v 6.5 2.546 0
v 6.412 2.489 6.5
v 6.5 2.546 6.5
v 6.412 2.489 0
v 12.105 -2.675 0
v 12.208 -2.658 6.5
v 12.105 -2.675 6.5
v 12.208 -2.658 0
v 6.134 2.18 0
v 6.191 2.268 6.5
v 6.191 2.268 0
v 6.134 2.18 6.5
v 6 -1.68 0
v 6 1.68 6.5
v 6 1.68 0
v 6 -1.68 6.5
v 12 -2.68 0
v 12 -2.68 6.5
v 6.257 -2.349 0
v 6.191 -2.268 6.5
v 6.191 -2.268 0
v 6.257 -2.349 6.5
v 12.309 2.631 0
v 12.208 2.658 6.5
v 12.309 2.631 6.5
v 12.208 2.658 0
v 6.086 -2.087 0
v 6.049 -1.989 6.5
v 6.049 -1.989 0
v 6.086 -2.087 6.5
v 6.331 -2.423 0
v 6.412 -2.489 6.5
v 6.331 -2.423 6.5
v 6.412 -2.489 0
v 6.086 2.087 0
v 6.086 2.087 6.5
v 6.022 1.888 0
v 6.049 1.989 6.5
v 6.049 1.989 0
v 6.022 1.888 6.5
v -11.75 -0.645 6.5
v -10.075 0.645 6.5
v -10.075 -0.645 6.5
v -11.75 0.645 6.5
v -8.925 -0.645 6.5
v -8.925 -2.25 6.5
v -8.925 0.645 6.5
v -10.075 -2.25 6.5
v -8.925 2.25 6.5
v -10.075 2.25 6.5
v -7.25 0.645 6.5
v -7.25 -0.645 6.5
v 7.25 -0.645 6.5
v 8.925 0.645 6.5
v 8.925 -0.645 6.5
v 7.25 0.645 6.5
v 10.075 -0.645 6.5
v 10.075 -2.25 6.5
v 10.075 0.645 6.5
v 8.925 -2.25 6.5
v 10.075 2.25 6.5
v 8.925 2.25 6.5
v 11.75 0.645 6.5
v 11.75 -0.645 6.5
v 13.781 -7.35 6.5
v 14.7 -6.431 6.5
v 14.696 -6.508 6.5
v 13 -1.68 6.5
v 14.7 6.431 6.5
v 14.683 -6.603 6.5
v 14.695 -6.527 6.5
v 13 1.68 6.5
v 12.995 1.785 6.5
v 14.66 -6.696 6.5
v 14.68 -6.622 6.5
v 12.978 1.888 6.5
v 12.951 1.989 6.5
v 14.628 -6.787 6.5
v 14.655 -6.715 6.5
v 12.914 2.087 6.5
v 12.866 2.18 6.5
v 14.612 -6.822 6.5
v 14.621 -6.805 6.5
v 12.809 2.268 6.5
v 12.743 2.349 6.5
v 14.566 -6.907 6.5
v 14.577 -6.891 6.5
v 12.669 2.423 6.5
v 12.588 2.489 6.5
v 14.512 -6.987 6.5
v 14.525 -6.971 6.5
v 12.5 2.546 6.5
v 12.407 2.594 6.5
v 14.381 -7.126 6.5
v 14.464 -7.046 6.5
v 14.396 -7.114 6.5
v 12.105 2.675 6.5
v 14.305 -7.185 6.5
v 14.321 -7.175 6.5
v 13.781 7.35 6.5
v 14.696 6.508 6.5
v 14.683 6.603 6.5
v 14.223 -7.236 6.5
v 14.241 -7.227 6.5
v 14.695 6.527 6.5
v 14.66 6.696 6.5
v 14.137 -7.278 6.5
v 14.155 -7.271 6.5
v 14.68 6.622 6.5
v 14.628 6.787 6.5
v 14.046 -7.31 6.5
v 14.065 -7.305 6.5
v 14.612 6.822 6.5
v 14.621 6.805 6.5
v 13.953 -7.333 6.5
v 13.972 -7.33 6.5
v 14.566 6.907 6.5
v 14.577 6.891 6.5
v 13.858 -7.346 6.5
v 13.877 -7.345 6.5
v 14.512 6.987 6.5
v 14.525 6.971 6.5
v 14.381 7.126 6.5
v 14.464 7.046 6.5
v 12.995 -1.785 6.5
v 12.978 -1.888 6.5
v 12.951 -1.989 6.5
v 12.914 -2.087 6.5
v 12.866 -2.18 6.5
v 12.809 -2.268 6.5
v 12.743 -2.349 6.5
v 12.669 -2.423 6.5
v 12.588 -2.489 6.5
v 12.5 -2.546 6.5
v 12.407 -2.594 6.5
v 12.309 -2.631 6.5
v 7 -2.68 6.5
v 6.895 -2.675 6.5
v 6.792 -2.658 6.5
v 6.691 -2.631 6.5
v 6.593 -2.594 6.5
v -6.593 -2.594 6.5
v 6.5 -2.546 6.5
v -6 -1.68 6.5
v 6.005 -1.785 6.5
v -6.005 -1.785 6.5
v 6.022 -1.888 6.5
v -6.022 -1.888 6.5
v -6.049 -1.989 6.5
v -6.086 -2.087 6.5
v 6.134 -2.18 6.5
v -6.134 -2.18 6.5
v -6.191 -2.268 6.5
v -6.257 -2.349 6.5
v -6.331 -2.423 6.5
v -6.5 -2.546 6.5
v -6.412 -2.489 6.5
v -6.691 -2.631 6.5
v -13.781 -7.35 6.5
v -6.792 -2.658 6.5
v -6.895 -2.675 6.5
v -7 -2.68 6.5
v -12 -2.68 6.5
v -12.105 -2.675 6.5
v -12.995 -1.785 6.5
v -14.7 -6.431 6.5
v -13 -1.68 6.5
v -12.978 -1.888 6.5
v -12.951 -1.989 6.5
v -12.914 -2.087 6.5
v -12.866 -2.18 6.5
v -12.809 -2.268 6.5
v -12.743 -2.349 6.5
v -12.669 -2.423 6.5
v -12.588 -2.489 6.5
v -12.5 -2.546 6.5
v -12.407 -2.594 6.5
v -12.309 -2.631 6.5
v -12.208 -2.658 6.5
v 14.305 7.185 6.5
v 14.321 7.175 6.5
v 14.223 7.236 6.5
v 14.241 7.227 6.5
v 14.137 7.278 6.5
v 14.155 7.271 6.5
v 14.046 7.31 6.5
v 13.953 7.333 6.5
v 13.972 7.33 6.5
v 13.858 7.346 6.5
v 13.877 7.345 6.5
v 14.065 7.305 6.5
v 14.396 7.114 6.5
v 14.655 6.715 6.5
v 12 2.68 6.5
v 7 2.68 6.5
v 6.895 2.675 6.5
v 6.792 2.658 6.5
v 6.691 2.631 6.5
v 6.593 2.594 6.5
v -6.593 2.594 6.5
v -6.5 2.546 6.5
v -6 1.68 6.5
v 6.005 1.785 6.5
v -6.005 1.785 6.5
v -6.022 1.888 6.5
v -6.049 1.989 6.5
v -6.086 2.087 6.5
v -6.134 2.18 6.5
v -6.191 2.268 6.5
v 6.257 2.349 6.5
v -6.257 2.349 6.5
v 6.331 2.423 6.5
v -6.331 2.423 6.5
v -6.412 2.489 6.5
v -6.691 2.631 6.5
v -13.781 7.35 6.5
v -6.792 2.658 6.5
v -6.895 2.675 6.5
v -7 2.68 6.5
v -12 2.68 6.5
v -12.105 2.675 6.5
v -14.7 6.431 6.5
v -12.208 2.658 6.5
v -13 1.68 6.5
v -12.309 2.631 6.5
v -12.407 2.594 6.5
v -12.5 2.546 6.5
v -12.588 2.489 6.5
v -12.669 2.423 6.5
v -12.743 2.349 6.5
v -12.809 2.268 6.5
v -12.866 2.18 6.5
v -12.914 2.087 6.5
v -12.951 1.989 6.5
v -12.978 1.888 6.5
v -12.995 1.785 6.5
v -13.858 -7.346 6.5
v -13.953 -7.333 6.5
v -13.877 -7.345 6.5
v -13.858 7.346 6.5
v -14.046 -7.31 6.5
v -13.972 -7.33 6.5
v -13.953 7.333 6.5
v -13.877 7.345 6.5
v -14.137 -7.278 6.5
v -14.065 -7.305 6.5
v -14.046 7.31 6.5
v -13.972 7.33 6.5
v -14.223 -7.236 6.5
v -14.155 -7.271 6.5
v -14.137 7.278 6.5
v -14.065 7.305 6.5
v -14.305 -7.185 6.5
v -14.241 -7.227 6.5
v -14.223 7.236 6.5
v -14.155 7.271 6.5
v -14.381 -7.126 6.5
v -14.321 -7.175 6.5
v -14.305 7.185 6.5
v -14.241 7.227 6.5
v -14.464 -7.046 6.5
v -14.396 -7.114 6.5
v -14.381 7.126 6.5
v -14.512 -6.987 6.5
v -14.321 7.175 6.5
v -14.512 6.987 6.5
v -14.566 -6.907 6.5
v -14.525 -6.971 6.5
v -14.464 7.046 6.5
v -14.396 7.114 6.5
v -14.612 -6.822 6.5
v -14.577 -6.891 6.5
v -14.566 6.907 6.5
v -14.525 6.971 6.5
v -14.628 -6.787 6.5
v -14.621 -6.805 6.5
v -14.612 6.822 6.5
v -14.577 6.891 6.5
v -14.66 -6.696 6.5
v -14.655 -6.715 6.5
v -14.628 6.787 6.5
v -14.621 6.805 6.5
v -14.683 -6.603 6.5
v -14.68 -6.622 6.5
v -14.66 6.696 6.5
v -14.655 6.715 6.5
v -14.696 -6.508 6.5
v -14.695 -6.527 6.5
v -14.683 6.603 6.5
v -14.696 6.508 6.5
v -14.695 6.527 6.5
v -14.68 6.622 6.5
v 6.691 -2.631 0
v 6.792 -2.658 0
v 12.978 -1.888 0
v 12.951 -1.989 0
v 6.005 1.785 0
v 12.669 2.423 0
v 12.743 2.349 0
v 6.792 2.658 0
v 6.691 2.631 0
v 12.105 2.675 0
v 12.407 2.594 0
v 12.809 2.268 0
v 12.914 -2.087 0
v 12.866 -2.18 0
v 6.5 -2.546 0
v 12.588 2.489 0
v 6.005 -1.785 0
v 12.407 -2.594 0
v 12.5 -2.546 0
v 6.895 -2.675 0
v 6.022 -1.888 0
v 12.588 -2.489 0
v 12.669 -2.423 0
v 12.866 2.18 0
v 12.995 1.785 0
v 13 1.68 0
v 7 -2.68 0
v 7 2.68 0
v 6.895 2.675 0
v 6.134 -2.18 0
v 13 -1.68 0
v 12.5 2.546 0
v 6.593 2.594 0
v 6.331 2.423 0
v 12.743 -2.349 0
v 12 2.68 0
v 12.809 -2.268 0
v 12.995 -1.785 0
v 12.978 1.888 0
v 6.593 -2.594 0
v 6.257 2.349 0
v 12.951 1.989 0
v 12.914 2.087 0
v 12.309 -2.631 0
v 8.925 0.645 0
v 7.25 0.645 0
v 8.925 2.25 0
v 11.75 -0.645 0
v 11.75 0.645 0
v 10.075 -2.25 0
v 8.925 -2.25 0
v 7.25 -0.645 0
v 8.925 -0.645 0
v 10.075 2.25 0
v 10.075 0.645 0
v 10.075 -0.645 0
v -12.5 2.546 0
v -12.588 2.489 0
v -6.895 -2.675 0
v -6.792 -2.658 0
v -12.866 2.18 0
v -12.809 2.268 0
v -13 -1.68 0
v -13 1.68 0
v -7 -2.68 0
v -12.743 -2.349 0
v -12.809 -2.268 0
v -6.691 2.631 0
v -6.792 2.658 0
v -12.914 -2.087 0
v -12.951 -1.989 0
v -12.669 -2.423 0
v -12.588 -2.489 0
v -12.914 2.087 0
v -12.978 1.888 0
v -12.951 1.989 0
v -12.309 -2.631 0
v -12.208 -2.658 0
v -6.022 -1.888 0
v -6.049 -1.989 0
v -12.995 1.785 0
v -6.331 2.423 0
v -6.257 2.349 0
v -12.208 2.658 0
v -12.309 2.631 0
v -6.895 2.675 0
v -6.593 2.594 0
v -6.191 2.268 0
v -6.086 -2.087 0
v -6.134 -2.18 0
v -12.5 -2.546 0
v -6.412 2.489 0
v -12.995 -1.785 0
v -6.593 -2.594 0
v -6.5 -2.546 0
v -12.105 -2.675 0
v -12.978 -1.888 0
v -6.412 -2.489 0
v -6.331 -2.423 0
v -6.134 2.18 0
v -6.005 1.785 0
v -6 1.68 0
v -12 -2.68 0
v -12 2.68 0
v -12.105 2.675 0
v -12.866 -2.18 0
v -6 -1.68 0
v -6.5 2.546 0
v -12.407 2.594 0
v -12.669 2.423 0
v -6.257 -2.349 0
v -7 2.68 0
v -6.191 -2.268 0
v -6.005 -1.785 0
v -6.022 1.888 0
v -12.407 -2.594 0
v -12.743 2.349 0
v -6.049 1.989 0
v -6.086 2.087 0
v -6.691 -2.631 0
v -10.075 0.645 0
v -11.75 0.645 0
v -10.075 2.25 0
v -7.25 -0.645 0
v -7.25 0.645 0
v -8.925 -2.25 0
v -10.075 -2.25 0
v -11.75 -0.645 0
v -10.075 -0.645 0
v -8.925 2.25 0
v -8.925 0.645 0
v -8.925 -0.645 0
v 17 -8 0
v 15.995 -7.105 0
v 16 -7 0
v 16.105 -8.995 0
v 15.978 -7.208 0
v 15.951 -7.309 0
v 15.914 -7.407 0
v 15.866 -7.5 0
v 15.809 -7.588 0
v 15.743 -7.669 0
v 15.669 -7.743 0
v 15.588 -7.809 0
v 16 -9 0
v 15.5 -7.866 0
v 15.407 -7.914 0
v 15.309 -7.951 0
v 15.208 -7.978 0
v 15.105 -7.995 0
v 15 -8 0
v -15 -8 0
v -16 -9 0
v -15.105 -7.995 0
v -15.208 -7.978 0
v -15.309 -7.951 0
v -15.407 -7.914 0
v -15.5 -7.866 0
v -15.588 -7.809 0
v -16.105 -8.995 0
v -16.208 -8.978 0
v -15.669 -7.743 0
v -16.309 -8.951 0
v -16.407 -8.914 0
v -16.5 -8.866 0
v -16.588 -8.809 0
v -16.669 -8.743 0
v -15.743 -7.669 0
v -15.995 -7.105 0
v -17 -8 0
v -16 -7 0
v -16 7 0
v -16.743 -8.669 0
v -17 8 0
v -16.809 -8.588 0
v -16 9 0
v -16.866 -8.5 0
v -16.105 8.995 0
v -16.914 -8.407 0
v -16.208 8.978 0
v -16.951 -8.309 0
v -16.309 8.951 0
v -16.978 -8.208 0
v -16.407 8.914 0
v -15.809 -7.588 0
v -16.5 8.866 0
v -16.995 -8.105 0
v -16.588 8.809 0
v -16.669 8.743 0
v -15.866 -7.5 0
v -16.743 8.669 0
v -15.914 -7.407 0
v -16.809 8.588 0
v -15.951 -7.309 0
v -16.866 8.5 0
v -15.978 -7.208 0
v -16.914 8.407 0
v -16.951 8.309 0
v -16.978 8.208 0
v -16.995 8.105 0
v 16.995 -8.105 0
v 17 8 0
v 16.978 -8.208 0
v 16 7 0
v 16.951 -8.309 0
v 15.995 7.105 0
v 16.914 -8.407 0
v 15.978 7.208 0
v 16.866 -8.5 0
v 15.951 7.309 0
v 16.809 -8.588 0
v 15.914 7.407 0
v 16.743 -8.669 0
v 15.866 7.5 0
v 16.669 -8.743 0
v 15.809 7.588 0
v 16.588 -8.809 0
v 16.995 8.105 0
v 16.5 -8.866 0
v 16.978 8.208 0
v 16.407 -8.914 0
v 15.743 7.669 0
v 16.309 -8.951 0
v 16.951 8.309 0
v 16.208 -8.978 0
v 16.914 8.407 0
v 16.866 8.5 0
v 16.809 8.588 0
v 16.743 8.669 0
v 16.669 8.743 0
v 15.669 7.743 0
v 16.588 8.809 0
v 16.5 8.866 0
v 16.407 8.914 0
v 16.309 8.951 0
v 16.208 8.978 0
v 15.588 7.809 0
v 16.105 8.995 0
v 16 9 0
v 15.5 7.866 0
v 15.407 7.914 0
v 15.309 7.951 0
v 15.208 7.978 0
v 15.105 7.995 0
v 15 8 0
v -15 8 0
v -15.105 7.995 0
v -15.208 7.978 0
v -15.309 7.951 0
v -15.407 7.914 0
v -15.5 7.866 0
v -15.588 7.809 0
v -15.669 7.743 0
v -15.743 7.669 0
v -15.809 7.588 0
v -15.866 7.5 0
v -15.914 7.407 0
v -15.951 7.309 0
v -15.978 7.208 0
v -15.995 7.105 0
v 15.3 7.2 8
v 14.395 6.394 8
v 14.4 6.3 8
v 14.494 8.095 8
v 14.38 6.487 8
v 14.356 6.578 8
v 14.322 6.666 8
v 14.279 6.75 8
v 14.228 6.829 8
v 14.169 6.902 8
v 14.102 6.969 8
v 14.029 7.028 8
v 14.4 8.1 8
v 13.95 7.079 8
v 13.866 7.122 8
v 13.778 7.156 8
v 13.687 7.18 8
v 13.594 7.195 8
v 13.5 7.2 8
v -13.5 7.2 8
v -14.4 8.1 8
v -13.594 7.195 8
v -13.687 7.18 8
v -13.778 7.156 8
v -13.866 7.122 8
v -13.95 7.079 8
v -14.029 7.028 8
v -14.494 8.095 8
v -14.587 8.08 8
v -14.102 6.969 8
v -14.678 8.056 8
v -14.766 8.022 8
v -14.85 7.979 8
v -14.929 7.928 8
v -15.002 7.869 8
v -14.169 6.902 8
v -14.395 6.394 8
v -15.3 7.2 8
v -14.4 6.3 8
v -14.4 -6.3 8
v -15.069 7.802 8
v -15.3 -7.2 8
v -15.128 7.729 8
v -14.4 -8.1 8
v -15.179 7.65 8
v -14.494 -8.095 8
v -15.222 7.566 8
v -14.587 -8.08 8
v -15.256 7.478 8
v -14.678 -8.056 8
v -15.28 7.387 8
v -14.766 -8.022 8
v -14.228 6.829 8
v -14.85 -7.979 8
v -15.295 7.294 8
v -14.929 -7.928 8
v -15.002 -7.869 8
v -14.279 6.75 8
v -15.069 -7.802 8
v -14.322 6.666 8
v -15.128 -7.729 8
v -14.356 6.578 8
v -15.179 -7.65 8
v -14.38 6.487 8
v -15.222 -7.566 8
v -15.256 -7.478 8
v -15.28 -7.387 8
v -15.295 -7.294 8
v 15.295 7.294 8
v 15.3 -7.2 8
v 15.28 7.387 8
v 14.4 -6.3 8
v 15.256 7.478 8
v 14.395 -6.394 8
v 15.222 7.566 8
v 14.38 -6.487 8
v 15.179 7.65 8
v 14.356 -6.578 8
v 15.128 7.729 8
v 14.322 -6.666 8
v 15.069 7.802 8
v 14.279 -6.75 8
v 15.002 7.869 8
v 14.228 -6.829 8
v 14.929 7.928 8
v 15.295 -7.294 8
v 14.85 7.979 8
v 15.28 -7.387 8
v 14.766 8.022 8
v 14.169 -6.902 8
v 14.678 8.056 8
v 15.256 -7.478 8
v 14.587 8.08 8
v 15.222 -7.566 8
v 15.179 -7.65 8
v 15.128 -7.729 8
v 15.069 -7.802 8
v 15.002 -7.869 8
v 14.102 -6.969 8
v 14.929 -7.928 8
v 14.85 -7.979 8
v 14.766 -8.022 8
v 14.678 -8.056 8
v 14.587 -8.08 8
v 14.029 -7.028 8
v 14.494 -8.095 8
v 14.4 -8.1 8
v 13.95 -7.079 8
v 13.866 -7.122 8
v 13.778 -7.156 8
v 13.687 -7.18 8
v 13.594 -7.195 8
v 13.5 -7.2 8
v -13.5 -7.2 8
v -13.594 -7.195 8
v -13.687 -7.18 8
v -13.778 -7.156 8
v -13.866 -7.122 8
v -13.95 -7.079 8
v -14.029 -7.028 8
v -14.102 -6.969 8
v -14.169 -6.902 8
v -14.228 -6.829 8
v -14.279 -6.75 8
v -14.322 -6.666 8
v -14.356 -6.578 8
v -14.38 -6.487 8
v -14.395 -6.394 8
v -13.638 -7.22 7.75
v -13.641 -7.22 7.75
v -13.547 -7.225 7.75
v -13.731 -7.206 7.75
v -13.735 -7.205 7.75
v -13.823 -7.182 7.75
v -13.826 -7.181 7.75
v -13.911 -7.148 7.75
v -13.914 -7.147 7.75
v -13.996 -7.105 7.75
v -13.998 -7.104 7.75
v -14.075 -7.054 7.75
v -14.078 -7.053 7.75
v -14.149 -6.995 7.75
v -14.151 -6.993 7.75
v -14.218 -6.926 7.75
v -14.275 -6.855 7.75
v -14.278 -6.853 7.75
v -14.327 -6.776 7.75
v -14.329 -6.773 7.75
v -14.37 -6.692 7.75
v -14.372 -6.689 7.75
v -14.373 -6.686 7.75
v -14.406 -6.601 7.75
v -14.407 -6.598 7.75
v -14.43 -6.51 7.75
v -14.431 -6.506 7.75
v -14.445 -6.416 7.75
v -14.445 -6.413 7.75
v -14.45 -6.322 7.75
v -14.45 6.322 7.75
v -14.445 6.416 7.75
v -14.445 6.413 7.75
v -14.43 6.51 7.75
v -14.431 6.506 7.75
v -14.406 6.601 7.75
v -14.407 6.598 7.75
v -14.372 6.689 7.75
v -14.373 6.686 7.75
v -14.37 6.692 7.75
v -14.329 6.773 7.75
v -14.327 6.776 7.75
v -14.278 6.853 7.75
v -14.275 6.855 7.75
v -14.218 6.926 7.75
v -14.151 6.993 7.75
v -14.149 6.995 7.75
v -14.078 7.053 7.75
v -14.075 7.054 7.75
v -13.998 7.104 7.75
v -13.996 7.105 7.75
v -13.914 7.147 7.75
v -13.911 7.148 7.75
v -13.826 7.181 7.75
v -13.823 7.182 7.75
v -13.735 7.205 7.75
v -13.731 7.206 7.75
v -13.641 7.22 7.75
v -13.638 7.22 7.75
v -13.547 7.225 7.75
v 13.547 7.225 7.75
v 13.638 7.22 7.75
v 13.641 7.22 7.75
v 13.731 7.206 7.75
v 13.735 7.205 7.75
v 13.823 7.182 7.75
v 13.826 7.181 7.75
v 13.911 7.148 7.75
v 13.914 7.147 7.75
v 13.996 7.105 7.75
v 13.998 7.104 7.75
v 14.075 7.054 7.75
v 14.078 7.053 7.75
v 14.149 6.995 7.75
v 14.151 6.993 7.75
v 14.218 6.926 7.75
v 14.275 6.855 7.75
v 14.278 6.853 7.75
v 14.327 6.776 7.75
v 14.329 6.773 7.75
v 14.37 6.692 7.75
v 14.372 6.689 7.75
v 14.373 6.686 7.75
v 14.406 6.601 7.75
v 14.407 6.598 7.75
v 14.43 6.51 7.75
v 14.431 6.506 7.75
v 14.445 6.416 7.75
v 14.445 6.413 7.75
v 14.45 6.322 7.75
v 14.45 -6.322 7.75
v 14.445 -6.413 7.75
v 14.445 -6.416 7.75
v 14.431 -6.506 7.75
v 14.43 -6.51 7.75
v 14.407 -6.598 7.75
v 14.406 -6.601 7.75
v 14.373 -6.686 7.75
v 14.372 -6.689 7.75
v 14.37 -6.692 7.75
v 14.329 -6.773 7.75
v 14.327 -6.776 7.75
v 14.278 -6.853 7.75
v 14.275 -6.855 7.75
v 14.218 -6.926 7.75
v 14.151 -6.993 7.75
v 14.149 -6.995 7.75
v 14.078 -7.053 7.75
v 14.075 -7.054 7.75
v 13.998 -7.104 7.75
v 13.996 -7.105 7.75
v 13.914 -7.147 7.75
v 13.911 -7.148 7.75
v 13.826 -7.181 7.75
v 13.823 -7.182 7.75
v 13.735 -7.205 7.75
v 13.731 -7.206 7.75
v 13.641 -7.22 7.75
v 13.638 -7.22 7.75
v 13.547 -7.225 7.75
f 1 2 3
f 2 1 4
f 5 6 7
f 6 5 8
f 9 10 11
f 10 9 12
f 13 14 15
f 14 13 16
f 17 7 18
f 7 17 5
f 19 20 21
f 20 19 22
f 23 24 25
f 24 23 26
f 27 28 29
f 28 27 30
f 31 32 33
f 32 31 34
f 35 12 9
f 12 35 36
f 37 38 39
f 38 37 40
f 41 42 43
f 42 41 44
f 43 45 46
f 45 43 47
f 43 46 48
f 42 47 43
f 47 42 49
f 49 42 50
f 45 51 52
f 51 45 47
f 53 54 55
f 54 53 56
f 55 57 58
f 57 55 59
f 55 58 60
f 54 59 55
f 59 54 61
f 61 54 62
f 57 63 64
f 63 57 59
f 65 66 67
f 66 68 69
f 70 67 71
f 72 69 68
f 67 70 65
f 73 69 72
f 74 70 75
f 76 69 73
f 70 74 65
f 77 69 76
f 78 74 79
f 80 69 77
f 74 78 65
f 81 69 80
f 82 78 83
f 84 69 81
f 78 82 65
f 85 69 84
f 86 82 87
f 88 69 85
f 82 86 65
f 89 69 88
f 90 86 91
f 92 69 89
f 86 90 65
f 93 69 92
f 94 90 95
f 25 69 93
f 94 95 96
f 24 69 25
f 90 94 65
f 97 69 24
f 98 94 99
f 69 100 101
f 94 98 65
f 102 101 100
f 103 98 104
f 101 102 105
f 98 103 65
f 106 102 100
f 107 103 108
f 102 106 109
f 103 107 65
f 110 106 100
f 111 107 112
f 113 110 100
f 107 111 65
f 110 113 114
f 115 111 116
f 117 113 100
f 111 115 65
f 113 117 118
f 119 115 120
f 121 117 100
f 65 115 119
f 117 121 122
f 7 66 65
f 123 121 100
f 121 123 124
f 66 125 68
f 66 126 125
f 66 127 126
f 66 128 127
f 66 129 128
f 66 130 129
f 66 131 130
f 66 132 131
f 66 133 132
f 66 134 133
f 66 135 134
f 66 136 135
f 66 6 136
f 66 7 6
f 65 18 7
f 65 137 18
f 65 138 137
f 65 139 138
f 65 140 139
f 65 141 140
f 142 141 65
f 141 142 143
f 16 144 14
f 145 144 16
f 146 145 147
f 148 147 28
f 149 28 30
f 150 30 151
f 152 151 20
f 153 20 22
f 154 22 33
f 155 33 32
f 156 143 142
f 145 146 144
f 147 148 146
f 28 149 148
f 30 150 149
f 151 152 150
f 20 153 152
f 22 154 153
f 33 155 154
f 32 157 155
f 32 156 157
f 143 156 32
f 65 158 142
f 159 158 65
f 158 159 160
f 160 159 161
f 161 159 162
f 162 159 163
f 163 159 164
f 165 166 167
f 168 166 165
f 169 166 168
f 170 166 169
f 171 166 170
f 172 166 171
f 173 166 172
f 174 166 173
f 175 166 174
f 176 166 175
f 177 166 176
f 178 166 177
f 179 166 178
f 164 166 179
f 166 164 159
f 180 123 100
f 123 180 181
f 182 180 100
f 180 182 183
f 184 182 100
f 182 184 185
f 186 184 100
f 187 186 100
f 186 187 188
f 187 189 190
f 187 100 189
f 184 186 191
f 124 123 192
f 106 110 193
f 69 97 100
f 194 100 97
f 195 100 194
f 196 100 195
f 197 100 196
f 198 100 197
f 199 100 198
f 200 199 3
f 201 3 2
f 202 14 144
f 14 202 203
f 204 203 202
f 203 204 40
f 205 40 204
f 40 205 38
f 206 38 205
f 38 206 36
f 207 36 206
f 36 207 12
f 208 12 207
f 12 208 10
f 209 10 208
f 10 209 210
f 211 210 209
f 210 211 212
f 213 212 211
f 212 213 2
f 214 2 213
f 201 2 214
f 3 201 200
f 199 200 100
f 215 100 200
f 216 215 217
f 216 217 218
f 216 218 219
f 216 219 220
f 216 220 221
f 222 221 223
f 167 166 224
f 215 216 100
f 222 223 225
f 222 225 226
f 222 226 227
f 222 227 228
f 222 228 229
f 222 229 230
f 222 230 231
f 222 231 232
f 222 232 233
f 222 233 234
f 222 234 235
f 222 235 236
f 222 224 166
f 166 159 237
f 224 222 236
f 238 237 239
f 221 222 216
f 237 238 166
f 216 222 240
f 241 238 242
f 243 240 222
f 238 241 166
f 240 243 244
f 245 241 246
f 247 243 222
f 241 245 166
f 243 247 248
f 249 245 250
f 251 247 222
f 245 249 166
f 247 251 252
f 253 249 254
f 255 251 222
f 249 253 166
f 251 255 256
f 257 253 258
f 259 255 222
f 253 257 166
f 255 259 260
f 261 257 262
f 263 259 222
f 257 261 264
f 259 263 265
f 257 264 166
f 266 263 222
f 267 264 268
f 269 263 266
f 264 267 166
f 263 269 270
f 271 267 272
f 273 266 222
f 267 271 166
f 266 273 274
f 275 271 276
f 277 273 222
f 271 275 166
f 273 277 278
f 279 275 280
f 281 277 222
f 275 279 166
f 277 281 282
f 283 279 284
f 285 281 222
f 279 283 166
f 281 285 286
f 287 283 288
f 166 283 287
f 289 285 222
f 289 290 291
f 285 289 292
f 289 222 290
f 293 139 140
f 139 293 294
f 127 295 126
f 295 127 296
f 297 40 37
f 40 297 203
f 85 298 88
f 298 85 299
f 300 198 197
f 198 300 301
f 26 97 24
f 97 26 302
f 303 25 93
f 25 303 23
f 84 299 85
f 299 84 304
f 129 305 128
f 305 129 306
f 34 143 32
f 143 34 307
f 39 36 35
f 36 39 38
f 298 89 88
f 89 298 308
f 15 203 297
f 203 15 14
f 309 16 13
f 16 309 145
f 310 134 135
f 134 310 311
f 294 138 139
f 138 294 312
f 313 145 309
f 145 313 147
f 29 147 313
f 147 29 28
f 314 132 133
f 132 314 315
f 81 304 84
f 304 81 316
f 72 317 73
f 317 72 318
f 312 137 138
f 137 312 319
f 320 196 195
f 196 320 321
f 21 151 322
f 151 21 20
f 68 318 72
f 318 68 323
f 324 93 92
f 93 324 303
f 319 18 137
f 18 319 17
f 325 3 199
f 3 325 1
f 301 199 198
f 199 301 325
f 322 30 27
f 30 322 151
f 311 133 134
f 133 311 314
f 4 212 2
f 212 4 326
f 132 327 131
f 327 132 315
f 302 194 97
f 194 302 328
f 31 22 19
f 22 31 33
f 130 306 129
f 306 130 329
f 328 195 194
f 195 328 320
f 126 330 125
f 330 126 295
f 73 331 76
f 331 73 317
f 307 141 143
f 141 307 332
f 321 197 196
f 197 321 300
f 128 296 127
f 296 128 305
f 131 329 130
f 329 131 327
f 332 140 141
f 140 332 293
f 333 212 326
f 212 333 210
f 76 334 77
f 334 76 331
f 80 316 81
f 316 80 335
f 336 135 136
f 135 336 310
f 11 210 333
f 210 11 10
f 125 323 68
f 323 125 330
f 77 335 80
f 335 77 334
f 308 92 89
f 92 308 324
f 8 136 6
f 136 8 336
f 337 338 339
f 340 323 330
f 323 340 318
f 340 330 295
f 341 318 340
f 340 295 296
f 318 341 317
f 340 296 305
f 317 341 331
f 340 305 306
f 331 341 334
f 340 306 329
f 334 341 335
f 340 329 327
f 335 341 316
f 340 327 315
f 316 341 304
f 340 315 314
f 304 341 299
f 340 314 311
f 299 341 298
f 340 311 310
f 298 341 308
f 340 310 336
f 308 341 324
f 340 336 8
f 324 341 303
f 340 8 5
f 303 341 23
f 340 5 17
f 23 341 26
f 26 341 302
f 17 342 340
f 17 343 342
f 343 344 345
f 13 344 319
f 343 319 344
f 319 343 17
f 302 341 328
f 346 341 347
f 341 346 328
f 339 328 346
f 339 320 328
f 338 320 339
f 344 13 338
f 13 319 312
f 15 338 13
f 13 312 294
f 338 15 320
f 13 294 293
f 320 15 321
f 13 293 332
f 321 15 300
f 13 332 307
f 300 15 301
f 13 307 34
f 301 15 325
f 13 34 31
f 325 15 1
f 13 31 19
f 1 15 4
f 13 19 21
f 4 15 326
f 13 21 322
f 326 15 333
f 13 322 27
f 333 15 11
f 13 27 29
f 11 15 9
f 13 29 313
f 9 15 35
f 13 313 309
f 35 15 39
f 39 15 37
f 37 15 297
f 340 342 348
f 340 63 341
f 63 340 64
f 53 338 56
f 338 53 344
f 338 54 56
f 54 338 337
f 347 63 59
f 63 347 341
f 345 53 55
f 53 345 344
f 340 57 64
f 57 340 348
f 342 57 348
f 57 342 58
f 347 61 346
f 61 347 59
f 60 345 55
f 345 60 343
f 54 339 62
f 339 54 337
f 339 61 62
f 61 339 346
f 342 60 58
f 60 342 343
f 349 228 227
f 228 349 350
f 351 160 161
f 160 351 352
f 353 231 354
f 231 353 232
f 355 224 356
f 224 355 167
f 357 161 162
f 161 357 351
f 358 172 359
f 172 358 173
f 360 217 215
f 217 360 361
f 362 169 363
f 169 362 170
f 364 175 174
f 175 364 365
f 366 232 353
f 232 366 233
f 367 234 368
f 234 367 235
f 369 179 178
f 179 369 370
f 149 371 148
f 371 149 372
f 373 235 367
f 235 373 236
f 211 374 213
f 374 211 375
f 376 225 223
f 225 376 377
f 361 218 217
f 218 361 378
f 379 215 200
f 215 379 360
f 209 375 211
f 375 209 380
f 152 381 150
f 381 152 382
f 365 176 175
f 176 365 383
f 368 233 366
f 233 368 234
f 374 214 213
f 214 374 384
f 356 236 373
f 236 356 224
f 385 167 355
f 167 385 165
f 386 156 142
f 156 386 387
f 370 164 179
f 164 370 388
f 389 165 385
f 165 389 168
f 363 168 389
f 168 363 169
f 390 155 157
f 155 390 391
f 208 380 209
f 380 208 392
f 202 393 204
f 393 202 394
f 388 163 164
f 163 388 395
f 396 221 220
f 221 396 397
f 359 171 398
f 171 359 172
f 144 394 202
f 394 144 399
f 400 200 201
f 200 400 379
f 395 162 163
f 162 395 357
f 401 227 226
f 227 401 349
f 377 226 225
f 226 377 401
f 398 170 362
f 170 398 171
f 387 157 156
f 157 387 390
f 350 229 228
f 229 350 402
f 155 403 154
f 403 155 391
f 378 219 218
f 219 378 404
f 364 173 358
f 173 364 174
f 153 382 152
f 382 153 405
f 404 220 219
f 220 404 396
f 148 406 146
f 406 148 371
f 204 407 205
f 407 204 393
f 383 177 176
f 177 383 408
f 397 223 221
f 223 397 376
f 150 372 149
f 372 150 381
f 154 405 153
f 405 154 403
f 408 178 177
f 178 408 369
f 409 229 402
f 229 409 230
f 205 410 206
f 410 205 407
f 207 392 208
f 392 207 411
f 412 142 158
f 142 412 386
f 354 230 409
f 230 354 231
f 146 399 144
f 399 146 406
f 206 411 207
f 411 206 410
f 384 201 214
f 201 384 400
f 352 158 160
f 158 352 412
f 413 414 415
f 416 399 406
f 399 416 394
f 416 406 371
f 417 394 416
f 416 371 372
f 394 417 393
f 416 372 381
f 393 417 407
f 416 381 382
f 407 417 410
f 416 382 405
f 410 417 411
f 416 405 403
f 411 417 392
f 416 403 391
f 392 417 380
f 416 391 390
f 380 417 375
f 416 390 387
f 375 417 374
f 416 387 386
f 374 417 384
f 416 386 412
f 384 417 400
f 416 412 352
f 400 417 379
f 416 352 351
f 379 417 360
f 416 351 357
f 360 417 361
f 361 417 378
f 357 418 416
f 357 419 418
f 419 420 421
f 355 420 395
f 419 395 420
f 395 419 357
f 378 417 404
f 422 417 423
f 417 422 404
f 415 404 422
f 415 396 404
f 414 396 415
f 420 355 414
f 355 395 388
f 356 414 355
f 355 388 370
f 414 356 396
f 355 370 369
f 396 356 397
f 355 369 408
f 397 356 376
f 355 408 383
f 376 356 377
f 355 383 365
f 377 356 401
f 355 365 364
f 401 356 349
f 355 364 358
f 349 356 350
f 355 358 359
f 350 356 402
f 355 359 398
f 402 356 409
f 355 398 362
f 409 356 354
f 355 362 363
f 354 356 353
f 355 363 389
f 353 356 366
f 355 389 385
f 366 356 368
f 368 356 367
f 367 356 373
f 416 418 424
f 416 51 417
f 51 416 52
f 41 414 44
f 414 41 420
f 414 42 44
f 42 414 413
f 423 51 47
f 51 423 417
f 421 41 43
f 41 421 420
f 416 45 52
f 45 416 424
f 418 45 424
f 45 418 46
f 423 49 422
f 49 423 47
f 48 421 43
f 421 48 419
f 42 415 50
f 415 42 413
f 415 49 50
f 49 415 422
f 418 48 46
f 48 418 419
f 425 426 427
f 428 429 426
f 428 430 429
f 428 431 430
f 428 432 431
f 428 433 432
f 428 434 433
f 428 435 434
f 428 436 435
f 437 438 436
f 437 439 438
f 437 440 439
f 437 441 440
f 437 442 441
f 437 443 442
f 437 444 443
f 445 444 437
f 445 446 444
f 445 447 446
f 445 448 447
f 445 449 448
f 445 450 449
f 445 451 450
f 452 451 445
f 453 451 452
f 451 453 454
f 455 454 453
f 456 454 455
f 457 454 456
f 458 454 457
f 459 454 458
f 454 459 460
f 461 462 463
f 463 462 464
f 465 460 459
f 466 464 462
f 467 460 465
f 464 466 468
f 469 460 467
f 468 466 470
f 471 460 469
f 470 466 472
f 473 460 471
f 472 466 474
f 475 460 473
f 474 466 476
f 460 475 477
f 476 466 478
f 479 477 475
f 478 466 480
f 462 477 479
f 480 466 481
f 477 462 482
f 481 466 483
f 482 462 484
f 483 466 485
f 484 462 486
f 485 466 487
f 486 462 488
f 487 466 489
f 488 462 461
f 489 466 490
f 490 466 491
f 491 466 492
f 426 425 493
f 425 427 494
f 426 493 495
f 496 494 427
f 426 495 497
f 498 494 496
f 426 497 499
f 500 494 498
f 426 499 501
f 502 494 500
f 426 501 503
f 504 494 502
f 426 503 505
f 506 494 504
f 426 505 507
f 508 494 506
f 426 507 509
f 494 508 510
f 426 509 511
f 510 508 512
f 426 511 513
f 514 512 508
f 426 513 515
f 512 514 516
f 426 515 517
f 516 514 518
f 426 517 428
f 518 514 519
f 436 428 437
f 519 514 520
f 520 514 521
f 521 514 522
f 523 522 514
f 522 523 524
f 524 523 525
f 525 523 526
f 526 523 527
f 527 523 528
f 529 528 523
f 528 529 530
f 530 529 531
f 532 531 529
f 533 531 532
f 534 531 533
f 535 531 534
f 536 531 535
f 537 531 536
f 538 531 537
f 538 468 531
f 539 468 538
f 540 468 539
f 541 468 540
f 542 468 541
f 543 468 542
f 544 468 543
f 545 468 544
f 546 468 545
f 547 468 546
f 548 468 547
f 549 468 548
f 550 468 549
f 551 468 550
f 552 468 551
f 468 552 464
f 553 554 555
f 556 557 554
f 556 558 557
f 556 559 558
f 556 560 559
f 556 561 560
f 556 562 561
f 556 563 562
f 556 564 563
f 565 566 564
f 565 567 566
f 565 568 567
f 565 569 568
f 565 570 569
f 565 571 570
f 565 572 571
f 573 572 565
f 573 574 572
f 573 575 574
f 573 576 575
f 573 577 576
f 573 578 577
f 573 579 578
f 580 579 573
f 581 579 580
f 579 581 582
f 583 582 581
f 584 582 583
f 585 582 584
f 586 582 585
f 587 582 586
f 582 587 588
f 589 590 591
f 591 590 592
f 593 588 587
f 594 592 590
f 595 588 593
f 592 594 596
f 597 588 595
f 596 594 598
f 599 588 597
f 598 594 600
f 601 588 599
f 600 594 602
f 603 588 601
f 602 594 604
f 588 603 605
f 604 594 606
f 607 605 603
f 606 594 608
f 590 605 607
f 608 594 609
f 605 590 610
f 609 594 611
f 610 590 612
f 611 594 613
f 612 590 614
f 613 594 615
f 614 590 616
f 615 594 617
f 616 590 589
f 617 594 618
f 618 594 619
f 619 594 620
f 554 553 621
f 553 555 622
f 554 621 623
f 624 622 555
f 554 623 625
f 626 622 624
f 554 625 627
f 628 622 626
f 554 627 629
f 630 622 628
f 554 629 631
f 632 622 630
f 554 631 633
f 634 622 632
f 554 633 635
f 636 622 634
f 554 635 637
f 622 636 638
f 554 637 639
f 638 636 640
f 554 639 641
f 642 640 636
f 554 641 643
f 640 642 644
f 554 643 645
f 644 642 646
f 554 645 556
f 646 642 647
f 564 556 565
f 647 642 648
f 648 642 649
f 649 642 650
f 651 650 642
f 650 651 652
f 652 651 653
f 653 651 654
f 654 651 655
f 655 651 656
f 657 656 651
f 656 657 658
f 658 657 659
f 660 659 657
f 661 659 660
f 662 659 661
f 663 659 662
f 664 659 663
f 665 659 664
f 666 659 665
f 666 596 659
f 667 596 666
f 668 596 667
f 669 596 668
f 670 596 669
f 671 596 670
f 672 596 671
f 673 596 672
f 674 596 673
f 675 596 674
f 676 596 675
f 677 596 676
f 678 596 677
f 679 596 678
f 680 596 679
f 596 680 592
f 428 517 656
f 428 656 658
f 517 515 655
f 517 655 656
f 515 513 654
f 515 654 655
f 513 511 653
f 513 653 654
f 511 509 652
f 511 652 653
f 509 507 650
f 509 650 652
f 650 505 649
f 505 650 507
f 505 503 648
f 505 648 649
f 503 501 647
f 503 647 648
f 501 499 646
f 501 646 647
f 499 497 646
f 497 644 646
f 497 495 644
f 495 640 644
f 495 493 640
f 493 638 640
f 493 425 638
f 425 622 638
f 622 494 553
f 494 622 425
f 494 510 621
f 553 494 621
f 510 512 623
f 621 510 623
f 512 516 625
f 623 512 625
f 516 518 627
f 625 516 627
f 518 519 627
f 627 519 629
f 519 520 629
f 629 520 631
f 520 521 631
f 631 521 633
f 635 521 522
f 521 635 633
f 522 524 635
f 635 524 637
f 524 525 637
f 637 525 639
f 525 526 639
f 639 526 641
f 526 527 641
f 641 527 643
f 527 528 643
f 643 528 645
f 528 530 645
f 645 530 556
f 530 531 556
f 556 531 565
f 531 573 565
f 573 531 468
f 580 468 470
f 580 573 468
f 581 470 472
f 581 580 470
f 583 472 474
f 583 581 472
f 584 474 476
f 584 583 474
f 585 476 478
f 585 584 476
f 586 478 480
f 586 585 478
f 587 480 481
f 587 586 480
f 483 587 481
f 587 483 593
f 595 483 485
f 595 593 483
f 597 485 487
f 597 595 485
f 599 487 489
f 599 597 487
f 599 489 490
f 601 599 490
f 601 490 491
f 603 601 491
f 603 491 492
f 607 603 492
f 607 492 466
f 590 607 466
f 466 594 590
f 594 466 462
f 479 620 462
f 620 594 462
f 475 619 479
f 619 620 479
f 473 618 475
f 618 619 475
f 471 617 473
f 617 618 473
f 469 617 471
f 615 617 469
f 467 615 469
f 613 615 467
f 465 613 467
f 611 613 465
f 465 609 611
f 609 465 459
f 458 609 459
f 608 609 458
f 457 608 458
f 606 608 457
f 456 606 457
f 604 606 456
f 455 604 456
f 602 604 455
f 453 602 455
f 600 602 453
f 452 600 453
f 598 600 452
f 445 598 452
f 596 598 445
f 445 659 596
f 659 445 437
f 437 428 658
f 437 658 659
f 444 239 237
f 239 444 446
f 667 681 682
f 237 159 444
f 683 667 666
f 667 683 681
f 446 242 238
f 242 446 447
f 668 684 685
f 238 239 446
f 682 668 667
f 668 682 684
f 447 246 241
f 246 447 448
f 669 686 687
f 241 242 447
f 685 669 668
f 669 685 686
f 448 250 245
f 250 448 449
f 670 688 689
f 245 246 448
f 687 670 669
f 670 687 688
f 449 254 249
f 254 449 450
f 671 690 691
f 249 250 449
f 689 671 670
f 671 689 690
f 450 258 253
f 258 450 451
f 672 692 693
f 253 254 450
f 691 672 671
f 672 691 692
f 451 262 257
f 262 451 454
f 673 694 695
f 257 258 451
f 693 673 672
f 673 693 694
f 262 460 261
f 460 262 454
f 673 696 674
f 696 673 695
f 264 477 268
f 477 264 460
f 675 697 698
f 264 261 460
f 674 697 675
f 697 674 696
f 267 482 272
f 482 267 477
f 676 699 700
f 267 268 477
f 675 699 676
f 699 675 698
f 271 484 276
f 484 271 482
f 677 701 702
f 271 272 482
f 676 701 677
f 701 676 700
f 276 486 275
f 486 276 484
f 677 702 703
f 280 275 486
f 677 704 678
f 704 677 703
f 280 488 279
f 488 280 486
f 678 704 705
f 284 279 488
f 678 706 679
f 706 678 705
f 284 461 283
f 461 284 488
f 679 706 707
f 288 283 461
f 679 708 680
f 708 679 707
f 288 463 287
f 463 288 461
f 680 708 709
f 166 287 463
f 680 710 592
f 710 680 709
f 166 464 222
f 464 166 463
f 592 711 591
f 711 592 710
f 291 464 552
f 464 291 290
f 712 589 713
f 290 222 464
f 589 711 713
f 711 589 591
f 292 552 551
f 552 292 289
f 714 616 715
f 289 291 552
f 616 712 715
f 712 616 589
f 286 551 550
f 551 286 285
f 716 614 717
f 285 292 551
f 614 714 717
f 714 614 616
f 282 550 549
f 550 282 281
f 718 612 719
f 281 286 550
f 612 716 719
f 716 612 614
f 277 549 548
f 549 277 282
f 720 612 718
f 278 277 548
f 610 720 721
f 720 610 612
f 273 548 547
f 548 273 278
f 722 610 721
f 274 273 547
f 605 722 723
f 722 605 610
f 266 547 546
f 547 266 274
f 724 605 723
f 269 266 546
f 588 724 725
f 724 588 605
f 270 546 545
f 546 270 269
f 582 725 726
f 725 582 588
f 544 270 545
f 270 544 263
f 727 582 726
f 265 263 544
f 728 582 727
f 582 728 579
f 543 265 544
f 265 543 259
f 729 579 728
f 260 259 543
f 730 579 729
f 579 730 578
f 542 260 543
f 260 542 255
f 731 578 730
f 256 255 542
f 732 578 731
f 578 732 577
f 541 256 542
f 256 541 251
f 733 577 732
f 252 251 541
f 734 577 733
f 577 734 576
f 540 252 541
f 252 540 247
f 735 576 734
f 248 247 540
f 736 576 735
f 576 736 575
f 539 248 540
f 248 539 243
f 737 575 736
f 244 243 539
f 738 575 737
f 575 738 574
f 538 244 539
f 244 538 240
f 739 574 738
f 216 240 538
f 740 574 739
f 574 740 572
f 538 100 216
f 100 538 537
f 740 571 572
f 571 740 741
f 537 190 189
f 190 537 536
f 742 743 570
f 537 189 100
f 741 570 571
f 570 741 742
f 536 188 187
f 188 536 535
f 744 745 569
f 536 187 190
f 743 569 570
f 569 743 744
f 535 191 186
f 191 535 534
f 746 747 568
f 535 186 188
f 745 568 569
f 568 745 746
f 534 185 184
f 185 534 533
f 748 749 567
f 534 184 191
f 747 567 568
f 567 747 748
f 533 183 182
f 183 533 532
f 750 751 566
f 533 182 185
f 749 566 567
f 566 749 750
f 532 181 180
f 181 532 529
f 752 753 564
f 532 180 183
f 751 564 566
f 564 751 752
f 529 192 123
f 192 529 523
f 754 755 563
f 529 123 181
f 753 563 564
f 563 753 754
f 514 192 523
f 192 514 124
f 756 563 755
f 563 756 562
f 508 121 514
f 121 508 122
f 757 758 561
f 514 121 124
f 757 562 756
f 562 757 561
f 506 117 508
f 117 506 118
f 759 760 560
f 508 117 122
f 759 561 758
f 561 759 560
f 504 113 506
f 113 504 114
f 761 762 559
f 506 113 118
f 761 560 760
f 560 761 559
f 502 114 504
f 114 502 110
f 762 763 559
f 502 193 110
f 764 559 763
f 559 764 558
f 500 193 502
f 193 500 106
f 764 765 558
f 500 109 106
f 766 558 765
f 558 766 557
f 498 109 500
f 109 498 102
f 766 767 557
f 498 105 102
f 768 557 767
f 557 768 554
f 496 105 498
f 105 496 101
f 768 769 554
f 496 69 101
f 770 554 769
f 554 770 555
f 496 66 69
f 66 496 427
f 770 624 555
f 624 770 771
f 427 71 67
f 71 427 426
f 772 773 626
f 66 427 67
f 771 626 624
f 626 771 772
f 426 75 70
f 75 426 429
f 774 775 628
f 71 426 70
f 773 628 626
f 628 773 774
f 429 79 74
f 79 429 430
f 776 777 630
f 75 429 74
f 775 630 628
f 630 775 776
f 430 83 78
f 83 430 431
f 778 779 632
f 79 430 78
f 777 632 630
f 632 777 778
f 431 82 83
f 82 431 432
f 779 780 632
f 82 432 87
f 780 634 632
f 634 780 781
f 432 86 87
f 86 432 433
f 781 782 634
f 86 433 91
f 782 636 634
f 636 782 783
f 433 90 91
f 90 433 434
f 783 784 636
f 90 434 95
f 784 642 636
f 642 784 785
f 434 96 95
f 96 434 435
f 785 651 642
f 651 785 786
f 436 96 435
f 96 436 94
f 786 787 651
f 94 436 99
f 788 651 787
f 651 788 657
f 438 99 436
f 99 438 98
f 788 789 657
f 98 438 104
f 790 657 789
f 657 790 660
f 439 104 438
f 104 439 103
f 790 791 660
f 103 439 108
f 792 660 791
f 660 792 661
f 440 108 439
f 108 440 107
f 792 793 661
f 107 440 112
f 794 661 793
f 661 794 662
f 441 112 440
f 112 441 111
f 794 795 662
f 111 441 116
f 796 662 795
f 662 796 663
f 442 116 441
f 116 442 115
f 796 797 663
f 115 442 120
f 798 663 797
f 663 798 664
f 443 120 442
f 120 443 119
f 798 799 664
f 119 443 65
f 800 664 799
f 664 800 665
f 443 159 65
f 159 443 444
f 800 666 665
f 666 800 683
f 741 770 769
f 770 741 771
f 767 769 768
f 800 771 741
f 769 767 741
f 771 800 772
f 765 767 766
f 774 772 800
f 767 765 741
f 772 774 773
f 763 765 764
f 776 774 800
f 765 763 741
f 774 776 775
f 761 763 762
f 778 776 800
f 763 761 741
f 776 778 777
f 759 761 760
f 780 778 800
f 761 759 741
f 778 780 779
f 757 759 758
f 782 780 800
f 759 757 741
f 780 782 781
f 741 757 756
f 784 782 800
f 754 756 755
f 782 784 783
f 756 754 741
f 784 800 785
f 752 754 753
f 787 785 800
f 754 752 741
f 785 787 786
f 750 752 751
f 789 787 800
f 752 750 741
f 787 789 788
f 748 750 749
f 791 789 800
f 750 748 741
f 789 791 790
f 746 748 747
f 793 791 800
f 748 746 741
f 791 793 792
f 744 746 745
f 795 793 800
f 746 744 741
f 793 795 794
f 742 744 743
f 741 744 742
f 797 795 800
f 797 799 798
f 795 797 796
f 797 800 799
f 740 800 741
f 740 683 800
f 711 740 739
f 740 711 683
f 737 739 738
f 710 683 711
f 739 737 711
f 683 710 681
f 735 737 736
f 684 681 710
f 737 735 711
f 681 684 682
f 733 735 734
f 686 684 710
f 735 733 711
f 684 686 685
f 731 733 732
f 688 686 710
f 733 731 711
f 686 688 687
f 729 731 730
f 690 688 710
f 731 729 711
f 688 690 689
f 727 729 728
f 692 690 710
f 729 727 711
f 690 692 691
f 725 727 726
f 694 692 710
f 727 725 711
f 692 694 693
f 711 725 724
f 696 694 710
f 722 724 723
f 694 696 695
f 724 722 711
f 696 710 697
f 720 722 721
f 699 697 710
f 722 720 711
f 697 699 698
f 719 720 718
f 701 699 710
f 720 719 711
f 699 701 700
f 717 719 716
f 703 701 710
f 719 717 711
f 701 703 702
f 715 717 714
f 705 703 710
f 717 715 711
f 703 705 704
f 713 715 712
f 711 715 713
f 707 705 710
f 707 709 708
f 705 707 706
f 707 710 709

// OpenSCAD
// Define higher resolution for transformations

$fn=60;

union() {
    // sides
    color("#FFA500")
    linear_extrude(height = 8, scale=0.90)
    difference() {
        offset(r=1) square([32, 16], true);
        offset(r=1) square([30, 14], true);
    }

    // top ceiling
    color("#FF8C00")
    translate([0,0,6.5])
        linear_extrude(height = 1.25)
        offset(r=1)
        square([28, 13], true);

    // fitting support
    color("#FF7F50")
    translate([9.5, 0, 3.25])
    difference(){
        // housing fitting
        hull() {
            translate([2.50, 1.68, 0])   cylinder(6.5, 1, 1, true);
            translate([-2.50, 1.68, 0])  cylinder(6.5, 1, 1, true);
            translate([2.50, -1.68, 0])  cylinder(6.5, 1, 1, true);
            translate([-2.50, -1.68, 0]) cylinder(6.5, 1, 1, true);
        }
        // cross fitting cutoff
        cube([4.5, 1.29, 10], true);
        cube([1.15, 4.5, 10], true);
    }

    // fitting support
    color("#FF7F50")
    translate([-9.5, 0, 3.25])
    difference(){
        // housing fitting
        hull() {
            translate([2.50, 1.68, 0])   cylinder(6.5, 1, 1, true);
            translate([-2.50, 1.68, 0])  cylinder(6.5, 1, 1, true);
            translate([2.50, -1.68, 0])  cylinder(6.5, 1, 1, true);
            translate([-2.50, -1.68, 0]) cylinder(6.5, 1, 1, true);
        }
        // cross fitting cutoff
        cube([4.5, 1.29, 10], true);
        cube([1.15, 4.5, 10], true);
    }
}
